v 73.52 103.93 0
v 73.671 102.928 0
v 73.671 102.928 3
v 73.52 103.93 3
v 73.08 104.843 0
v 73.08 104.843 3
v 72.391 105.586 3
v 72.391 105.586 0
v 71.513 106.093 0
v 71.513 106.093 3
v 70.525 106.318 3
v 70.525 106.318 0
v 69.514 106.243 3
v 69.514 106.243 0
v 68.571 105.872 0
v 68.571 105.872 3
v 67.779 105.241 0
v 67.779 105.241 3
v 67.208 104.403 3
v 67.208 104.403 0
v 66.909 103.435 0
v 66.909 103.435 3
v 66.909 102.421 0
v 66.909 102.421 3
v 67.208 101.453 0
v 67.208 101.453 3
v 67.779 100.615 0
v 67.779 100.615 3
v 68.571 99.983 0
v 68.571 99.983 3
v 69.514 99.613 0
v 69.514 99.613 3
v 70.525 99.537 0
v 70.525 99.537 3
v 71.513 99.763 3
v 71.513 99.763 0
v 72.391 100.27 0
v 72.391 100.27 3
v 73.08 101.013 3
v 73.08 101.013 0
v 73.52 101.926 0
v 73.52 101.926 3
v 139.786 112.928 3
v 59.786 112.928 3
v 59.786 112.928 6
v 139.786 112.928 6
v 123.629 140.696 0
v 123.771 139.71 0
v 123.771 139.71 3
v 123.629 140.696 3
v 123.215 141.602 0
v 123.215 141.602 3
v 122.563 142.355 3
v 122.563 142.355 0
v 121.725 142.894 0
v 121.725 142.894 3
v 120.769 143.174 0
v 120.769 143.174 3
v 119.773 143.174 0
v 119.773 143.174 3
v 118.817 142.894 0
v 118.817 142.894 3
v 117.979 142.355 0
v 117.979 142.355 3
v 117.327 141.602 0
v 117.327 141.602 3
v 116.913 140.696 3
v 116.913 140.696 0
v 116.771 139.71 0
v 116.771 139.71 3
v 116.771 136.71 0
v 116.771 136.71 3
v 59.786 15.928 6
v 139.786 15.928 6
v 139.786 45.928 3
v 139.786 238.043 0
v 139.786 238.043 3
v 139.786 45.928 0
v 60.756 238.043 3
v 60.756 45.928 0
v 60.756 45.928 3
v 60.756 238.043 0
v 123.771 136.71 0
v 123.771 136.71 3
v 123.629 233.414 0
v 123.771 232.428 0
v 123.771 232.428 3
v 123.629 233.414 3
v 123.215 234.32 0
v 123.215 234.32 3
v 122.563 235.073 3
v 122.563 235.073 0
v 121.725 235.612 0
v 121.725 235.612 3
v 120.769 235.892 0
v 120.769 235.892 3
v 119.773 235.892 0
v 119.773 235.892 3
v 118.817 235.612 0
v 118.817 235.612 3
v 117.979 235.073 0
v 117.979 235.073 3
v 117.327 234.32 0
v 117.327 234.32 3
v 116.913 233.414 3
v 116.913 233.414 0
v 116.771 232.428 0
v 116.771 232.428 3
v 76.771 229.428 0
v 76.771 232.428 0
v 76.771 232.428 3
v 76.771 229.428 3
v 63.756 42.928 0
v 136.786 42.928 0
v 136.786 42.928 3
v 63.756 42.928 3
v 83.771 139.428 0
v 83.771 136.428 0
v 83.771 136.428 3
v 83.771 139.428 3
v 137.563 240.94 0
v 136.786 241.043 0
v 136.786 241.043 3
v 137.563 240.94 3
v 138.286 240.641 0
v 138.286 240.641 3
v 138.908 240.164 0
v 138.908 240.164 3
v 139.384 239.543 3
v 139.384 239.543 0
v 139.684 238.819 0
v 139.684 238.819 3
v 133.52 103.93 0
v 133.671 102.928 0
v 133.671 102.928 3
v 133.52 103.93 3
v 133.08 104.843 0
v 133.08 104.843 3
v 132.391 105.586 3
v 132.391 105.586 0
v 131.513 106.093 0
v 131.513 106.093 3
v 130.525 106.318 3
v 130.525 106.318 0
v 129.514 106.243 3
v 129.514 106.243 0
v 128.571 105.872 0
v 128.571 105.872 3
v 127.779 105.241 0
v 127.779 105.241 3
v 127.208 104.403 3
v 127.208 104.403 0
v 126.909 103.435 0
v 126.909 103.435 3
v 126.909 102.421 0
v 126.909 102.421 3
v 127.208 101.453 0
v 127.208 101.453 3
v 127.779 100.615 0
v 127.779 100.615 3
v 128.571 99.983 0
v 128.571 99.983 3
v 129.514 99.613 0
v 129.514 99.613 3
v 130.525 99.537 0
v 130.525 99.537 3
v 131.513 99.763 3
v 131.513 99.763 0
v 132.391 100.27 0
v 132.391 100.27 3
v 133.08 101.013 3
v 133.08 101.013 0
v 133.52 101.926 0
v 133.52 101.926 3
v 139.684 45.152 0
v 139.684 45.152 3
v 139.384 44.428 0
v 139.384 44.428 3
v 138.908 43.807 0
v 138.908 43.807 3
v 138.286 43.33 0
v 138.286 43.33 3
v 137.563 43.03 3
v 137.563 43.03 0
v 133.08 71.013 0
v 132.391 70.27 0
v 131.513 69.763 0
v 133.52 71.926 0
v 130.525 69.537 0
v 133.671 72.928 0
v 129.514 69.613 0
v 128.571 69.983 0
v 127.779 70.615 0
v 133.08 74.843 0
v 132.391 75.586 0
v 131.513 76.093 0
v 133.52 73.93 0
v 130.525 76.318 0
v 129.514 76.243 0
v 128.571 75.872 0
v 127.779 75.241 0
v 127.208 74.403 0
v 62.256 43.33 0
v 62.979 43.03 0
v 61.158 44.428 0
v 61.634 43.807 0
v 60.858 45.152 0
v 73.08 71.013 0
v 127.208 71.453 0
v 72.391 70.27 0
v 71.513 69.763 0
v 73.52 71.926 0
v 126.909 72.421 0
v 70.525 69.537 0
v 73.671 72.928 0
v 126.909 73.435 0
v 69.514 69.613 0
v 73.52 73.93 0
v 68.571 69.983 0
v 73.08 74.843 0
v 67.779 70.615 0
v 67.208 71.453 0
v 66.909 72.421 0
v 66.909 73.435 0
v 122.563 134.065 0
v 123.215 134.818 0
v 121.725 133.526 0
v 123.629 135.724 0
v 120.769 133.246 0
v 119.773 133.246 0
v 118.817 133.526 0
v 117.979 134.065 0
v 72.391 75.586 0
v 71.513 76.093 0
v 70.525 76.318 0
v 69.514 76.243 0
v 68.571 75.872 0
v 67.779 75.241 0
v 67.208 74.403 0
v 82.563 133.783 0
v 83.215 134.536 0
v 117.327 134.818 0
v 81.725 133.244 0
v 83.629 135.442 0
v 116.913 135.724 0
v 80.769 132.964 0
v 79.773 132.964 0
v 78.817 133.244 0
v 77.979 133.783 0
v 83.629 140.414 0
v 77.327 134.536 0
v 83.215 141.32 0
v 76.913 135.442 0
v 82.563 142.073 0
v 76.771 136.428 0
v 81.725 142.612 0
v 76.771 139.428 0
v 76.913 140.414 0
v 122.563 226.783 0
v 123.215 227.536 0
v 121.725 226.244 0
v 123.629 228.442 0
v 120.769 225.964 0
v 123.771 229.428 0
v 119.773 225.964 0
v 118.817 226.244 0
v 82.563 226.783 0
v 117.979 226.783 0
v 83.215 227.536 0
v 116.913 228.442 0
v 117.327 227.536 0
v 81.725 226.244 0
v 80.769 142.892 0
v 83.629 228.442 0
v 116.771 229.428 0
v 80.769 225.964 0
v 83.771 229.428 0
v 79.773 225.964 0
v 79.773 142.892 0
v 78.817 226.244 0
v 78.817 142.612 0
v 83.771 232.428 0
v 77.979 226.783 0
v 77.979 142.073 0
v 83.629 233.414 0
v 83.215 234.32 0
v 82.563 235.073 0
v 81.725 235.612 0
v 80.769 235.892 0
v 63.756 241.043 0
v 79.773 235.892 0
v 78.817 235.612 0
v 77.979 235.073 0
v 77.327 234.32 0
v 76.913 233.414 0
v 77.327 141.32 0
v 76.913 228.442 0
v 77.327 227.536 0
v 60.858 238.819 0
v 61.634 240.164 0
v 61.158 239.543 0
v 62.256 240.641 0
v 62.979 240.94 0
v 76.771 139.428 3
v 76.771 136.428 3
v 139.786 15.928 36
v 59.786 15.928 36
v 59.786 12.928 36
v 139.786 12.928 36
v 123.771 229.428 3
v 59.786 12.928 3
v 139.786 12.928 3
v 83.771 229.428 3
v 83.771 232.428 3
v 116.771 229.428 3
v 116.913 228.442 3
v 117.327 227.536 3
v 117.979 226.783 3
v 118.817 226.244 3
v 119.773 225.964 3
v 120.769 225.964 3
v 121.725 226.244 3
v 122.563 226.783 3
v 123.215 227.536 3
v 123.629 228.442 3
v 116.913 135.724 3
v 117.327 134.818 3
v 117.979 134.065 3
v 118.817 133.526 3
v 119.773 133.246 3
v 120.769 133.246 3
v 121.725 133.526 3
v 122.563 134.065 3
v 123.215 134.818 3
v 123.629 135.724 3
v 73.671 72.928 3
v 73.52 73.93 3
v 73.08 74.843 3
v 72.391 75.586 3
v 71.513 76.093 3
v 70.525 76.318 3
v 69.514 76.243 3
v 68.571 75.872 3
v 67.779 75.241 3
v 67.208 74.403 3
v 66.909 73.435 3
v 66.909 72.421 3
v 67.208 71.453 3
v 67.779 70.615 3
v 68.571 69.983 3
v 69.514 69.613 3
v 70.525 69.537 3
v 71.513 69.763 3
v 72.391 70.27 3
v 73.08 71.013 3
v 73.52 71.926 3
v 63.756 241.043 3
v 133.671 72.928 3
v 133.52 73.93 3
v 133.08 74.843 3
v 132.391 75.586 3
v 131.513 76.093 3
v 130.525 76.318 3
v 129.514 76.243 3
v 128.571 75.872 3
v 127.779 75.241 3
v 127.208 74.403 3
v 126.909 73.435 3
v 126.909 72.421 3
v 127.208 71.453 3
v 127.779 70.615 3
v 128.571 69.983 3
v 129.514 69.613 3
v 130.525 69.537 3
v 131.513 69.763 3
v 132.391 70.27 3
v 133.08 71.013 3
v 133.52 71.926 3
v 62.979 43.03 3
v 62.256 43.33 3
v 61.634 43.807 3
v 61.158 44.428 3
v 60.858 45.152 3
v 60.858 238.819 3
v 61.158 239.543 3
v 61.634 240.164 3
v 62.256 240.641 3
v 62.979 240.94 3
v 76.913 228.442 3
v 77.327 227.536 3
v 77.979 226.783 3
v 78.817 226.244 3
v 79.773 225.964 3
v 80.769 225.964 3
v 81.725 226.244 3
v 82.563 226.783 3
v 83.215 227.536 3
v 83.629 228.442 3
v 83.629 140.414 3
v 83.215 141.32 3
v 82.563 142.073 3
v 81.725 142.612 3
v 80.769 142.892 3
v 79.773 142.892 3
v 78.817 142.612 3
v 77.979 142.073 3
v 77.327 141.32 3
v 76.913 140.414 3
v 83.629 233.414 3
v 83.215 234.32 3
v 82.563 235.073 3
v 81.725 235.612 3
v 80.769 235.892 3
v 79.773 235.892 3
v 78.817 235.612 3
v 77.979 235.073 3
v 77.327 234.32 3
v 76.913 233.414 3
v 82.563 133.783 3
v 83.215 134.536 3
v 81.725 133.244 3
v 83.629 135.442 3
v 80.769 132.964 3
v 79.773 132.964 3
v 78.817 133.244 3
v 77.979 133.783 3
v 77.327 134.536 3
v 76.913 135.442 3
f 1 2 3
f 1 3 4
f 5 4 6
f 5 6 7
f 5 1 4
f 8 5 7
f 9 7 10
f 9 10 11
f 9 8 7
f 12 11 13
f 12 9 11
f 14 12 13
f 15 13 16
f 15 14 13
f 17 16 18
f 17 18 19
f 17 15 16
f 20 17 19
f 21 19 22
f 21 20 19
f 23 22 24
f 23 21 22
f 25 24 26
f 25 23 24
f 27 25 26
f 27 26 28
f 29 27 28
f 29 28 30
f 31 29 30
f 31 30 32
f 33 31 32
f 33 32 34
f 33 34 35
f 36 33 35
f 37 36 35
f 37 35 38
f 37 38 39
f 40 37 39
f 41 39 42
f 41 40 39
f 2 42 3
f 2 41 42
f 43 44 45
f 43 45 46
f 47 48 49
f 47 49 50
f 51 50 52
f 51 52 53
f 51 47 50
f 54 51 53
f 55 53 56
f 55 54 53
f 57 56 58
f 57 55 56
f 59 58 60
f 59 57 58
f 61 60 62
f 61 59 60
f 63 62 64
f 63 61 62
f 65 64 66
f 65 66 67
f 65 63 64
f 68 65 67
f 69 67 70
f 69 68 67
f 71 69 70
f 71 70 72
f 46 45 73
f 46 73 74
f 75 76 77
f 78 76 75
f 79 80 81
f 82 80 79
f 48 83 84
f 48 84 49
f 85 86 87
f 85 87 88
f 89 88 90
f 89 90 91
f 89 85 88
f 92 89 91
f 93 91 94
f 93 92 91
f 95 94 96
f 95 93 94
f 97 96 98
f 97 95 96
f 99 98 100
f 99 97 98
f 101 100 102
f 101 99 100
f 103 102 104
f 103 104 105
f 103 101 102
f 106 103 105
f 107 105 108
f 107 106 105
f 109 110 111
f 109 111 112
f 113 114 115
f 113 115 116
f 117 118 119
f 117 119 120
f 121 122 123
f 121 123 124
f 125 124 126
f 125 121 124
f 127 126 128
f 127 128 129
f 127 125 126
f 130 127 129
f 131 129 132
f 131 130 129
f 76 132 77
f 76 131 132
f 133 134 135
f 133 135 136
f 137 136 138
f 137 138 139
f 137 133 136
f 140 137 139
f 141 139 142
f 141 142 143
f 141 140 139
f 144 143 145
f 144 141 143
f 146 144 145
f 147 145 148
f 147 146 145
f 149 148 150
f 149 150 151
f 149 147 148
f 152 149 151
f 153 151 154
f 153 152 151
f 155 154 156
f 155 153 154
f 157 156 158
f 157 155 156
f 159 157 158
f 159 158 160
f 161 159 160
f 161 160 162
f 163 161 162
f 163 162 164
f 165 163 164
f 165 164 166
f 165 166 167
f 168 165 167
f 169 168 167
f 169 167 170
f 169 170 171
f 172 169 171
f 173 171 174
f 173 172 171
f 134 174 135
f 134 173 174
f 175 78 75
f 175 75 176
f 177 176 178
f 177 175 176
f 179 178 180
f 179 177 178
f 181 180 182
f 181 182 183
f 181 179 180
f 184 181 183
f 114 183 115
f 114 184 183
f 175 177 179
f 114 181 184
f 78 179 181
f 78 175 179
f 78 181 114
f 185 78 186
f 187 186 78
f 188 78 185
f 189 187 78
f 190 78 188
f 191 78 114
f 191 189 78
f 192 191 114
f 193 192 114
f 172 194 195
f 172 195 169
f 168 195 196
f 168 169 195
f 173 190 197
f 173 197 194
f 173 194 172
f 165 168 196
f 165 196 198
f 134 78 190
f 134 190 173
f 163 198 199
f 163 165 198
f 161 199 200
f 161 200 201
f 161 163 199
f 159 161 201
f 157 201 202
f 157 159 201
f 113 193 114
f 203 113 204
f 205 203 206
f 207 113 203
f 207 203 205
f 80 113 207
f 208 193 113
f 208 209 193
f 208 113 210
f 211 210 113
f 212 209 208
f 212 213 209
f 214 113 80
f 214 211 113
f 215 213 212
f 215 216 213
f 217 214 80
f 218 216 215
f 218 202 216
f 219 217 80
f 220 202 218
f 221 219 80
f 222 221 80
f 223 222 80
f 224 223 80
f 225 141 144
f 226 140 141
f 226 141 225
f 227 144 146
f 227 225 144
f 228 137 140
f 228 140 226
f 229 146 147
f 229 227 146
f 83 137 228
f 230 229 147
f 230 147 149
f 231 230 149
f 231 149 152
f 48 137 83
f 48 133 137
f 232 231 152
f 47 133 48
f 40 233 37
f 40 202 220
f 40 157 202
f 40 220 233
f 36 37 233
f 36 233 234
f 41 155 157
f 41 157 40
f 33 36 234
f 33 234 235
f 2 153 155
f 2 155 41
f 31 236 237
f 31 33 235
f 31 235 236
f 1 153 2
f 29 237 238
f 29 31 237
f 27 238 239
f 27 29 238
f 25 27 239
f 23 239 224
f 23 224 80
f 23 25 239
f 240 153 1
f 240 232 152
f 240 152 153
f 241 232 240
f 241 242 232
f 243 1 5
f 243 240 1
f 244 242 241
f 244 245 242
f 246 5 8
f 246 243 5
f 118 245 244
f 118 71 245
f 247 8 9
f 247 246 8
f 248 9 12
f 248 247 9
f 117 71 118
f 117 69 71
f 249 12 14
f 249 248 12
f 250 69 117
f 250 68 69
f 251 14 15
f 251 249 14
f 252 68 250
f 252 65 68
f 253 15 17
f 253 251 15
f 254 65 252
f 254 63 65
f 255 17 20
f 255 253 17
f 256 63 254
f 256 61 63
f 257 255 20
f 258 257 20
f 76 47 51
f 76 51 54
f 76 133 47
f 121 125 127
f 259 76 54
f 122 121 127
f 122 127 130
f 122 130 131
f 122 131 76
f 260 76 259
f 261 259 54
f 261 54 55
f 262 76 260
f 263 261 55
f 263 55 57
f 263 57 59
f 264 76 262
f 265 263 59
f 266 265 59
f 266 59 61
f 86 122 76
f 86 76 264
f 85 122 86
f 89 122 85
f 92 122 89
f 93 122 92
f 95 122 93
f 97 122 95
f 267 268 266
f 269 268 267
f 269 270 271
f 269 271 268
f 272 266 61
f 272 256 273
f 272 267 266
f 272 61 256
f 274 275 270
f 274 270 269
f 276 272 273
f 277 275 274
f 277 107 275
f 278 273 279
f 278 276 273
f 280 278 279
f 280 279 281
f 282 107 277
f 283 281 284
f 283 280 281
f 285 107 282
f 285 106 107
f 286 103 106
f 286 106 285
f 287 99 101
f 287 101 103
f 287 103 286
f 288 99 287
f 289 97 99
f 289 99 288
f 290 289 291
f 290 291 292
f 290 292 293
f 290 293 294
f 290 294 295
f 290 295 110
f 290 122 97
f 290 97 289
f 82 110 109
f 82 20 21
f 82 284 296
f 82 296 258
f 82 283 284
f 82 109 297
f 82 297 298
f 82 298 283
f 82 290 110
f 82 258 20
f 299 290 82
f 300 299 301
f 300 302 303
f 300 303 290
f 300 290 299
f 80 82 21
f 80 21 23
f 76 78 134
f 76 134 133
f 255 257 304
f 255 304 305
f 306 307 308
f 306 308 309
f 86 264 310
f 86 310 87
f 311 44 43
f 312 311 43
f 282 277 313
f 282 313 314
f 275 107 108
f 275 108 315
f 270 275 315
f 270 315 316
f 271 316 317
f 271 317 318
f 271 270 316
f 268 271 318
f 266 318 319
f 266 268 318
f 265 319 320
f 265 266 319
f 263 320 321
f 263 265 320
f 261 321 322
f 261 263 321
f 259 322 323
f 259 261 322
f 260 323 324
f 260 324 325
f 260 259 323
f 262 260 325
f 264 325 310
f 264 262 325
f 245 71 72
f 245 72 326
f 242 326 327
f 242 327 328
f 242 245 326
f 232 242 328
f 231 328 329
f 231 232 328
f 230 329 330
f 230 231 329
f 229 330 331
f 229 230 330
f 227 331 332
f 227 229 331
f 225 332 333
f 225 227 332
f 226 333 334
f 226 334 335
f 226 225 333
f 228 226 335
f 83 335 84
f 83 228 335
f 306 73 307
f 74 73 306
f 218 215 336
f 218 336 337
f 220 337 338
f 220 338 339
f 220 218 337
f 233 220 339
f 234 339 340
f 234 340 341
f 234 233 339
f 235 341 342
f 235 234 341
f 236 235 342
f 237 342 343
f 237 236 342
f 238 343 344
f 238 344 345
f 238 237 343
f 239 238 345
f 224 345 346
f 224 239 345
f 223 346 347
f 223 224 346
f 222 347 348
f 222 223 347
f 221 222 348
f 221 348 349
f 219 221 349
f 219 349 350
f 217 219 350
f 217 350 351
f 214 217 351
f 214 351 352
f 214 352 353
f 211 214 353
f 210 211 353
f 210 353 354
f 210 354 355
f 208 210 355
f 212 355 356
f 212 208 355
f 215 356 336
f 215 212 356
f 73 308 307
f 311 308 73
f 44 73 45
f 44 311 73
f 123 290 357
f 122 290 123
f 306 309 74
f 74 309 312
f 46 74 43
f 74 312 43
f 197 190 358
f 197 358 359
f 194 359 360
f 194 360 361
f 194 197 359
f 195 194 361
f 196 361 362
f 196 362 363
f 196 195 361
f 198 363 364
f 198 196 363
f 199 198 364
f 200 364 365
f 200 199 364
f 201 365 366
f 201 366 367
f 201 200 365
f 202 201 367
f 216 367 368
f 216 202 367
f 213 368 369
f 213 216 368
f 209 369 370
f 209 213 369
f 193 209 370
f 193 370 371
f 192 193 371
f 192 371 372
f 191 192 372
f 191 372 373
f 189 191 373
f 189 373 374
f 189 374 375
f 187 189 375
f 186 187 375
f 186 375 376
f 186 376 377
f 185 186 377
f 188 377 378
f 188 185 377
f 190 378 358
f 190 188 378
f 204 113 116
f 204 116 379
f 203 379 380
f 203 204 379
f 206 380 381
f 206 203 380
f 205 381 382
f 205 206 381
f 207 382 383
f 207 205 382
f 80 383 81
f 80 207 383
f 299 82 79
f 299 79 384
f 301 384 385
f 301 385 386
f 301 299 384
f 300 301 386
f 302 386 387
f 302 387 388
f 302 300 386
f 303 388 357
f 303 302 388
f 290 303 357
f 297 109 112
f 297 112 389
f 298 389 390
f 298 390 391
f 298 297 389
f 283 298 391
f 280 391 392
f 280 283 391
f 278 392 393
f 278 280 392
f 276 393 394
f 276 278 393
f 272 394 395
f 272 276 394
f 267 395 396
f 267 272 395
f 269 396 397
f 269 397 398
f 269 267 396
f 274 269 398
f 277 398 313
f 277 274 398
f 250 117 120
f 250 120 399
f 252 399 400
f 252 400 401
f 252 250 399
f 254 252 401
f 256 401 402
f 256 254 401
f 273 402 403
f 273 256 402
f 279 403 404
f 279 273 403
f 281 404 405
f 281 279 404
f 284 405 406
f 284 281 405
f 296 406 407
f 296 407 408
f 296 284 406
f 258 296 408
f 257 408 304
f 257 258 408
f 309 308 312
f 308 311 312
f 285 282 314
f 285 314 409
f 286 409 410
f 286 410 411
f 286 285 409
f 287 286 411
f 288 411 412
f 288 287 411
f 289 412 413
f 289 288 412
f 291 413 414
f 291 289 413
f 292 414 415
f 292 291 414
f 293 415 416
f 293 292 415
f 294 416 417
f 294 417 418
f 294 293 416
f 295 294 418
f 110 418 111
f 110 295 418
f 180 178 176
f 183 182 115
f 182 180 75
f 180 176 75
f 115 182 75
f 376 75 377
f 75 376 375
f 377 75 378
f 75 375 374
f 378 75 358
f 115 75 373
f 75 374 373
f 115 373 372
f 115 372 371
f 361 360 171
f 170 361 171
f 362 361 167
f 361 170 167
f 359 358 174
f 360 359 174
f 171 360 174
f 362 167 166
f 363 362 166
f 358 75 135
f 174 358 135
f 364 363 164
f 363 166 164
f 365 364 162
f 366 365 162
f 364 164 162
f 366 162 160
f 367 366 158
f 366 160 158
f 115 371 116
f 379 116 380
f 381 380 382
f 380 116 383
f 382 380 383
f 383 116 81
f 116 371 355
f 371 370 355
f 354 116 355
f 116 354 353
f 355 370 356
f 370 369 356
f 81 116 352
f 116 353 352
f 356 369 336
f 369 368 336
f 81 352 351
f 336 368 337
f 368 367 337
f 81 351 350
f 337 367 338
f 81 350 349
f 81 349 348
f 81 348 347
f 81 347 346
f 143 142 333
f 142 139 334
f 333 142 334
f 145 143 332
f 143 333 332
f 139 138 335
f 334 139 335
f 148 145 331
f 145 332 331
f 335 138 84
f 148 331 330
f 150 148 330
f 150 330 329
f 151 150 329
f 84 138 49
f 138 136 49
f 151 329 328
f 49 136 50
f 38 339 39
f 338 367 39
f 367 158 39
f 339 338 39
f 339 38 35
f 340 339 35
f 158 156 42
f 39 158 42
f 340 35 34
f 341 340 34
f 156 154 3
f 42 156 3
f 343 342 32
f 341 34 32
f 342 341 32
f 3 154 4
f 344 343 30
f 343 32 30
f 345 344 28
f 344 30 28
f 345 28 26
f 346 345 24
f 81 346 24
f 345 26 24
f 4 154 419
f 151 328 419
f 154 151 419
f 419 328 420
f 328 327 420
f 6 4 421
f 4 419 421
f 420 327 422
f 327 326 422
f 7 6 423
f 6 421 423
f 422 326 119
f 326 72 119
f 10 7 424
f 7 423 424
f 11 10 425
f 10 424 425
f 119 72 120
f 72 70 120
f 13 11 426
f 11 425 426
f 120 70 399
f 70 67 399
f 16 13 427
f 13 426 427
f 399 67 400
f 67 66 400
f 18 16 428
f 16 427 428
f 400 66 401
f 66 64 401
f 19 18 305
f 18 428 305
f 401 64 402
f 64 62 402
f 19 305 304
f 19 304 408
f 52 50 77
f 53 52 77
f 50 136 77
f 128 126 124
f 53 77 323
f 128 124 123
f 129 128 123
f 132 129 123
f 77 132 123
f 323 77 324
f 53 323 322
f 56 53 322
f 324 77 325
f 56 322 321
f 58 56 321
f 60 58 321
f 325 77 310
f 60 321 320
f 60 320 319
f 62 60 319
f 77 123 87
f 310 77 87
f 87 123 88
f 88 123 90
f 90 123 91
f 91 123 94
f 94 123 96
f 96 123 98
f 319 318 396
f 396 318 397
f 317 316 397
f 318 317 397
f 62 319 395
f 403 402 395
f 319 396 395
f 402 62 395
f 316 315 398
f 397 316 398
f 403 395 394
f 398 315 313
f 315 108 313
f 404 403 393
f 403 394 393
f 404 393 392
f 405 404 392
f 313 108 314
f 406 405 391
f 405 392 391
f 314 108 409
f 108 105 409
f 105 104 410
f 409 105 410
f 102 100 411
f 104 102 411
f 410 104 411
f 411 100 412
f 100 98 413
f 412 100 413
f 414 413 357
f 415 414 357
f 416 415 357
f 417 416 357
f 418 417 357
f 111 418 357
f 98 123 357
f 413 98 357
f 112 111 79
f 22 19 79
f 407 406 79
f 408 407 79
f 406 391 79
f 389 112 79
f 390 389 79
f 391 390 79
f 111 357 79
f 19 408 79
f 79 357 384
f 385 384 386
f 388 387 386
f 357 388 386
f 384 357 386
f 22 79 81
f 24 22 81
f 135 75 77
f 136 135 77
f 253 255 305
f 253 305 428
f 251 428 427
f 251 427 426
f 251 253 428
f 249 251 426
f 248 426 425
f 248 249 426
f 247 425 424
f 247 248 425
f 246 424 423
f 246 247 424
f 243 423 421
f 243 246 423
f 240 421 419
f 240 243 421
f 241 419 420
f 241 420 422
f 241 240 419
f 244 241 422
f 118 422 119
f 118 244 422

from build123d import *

# Parameters (mm, degrees)
MODEL_R             = 3.4
BOSS_EXTRUDE1_DEPTH = 3
SKETCH2_W           = 80
SKETCH2_H           = 100
BOSS_EXTRUDE2_DEPTH = 3
SKETCH3_W           = 80
SKETCH3_H           = 3
BOSS_EXTRUDE3_DEPTH = 30


with BuildPart() as part:
    # Model → Boss-Extrude1 (new body)
    with BuildSketch(Plane.XY):
        with BuildLine():
            Line((60.755732344, 45.927973601), (60.755732344, 238.042706995))
            ThreePointArc((60.755732344, 238.042706995), (61.634412001, 240.164027338), (63.755732344, 241.042706995))
            Line((63.755732344, 241.042706995), (136.786203682, 241.042706995))
            ThreePointArc((136.786203682, 241.042706995), (138.907524026, 240.164027338), (139.786203682, 238.042706995))
            Line((139.786203682, 238.042706995), (139.786203682, 45.927973601))
            ThreePointArc((139.786203682, 45.927973601), (138.907524026, 43.806653257), (136.786203682, 42.927973601))
            Line((136.786203682, 42.927973601), (63.755732344, 42.927973601))
            ThreePointArc((63.755732344, 42.927973601), (61.634412001, 43.806653257), (60.755732344, 45.927973601))
        make_face()
        with Locations((70.270968013, 102.927973601)):
            Circle(MODEL_R, mode=Mode.SUBTRACT)
        with Locations((70.270968013, 72.927973601)):
            Circle(MODEL_R, mode=Mode.SUBTRACT)
        with Locations((130.270968013, 102.927973601)):
            Circle(MODEL_R, mode=Mode.SUBTRACT)
        with Locations((130.270968013, 72.927973601)):
            Circle(MODEL_R, mode=Mode.SUBTRACT)
        with BuildLine():
            Line((83.770968013, 136.427973601), (83.770968013, 139.427973601))
            ThreePointArc((83.770968013, 139.427973601), (80.270968013, 142.927973601), (76.770968013, 139.427973601))
            Line((76.770968013, 139.427973601), (76.770968013, 136.427973601))
            ThreePointArc((76.770968013, 136.427973601), (80.270968013, 132.927973601), (83.770968013, 136.427973601))
        make_face(mode=Mode.SUBTRACT)
        with BuildLine():
            Line((123.770968013, 136.710031471), (123.770968013, 139.710031471))
            ThreePointArc((123.770968013, 139.710031471), (120.270968013, 143.210031471), (116.770968013, 139.710031471))
            Line((116.770968013, 139.710031471), (116.770968013, 136.710031471))
            ThreePointArc((116.770968013, 136.710031471), (120.270968013, 133.210031471), (123.770968013, 136.710031471))
        make_face(mode=Mode.SUBTRACT)
        with BuildLine():
            Line((83.770968013, 229.427973601), (83.770968013, 232.427973601))
            ThreePointArc((83.770968013, 232.427973601), (80.270968013, 235.927973601), (76.770968013, 232.427973601))
            Line((76.770968013, 232.427973601), (76.770968013, 229.427973601))
            ThreePointArc((76.770968013, 229.427973601), (80.270968013, 225.927973601), (83.770968013, 229.427973601))
        make_face(mode=Mode.SUBTRACT)
        with BuildLine():
            Line((123.770968013, 229.427973601), (123.770968013, 232.427973601))
            ThreePointArc((123.770968013, 232.427973601), (120.270968013, 235.927973601), (116.770968013, 232.427973601))
            Line((116.770968013, 232.427973601), (116.770968013, 229.427973601))
            ThreePointArc((116.770968013, 229.427973601), (120.270968013, 225.927973601), (123.770968013, 229.427973601))
        make_face(mode=Mode.SUBTRACT)
    extrude(amount=BOSS_EXTRUDE1_DEPTH)


with BuildPart() as body_2:
    # Sketch2 → Boss-Extrude2 (new body)
    with BuildSketch(Plane.XY.offset(3)):
        with Locations((-202.453392637, 38.408485808)):
            Rectangle(SKETCH2_W, SKETCH2_H)
    extrude(amount=BOSS_EXTRUDE2_DEPTH)

    # Sketch3 → Boss-Extrude3 (add)
    with BuildSketch(Plane.XY.offset(6)):
        with Locations((-202.453392637, -10.091514192)):
            Rectangle(SKETCH3_W, SKETCH3_H)
    extrude(amount=BOSS_EXTRUDE3_DEPTH)


with BuildPart() as body_2_1:
    # Body-Move/Copy2: read off the stored shape, not the designer's step
    # Body-Move/Copy2: moved
    add(body_2.part.moved(Location((302.2395963, 0, 0))))


with BuildPart() as body_2_2:
    # Body-Move/Copy4: read off the stored shape, not the designer's step
    # Body-Move/Copy4: moved
    add(body_2_1.part.moved(Location((0, 24.5194878, 0))))


solid = Compound([part.part, body_2_2.part])
